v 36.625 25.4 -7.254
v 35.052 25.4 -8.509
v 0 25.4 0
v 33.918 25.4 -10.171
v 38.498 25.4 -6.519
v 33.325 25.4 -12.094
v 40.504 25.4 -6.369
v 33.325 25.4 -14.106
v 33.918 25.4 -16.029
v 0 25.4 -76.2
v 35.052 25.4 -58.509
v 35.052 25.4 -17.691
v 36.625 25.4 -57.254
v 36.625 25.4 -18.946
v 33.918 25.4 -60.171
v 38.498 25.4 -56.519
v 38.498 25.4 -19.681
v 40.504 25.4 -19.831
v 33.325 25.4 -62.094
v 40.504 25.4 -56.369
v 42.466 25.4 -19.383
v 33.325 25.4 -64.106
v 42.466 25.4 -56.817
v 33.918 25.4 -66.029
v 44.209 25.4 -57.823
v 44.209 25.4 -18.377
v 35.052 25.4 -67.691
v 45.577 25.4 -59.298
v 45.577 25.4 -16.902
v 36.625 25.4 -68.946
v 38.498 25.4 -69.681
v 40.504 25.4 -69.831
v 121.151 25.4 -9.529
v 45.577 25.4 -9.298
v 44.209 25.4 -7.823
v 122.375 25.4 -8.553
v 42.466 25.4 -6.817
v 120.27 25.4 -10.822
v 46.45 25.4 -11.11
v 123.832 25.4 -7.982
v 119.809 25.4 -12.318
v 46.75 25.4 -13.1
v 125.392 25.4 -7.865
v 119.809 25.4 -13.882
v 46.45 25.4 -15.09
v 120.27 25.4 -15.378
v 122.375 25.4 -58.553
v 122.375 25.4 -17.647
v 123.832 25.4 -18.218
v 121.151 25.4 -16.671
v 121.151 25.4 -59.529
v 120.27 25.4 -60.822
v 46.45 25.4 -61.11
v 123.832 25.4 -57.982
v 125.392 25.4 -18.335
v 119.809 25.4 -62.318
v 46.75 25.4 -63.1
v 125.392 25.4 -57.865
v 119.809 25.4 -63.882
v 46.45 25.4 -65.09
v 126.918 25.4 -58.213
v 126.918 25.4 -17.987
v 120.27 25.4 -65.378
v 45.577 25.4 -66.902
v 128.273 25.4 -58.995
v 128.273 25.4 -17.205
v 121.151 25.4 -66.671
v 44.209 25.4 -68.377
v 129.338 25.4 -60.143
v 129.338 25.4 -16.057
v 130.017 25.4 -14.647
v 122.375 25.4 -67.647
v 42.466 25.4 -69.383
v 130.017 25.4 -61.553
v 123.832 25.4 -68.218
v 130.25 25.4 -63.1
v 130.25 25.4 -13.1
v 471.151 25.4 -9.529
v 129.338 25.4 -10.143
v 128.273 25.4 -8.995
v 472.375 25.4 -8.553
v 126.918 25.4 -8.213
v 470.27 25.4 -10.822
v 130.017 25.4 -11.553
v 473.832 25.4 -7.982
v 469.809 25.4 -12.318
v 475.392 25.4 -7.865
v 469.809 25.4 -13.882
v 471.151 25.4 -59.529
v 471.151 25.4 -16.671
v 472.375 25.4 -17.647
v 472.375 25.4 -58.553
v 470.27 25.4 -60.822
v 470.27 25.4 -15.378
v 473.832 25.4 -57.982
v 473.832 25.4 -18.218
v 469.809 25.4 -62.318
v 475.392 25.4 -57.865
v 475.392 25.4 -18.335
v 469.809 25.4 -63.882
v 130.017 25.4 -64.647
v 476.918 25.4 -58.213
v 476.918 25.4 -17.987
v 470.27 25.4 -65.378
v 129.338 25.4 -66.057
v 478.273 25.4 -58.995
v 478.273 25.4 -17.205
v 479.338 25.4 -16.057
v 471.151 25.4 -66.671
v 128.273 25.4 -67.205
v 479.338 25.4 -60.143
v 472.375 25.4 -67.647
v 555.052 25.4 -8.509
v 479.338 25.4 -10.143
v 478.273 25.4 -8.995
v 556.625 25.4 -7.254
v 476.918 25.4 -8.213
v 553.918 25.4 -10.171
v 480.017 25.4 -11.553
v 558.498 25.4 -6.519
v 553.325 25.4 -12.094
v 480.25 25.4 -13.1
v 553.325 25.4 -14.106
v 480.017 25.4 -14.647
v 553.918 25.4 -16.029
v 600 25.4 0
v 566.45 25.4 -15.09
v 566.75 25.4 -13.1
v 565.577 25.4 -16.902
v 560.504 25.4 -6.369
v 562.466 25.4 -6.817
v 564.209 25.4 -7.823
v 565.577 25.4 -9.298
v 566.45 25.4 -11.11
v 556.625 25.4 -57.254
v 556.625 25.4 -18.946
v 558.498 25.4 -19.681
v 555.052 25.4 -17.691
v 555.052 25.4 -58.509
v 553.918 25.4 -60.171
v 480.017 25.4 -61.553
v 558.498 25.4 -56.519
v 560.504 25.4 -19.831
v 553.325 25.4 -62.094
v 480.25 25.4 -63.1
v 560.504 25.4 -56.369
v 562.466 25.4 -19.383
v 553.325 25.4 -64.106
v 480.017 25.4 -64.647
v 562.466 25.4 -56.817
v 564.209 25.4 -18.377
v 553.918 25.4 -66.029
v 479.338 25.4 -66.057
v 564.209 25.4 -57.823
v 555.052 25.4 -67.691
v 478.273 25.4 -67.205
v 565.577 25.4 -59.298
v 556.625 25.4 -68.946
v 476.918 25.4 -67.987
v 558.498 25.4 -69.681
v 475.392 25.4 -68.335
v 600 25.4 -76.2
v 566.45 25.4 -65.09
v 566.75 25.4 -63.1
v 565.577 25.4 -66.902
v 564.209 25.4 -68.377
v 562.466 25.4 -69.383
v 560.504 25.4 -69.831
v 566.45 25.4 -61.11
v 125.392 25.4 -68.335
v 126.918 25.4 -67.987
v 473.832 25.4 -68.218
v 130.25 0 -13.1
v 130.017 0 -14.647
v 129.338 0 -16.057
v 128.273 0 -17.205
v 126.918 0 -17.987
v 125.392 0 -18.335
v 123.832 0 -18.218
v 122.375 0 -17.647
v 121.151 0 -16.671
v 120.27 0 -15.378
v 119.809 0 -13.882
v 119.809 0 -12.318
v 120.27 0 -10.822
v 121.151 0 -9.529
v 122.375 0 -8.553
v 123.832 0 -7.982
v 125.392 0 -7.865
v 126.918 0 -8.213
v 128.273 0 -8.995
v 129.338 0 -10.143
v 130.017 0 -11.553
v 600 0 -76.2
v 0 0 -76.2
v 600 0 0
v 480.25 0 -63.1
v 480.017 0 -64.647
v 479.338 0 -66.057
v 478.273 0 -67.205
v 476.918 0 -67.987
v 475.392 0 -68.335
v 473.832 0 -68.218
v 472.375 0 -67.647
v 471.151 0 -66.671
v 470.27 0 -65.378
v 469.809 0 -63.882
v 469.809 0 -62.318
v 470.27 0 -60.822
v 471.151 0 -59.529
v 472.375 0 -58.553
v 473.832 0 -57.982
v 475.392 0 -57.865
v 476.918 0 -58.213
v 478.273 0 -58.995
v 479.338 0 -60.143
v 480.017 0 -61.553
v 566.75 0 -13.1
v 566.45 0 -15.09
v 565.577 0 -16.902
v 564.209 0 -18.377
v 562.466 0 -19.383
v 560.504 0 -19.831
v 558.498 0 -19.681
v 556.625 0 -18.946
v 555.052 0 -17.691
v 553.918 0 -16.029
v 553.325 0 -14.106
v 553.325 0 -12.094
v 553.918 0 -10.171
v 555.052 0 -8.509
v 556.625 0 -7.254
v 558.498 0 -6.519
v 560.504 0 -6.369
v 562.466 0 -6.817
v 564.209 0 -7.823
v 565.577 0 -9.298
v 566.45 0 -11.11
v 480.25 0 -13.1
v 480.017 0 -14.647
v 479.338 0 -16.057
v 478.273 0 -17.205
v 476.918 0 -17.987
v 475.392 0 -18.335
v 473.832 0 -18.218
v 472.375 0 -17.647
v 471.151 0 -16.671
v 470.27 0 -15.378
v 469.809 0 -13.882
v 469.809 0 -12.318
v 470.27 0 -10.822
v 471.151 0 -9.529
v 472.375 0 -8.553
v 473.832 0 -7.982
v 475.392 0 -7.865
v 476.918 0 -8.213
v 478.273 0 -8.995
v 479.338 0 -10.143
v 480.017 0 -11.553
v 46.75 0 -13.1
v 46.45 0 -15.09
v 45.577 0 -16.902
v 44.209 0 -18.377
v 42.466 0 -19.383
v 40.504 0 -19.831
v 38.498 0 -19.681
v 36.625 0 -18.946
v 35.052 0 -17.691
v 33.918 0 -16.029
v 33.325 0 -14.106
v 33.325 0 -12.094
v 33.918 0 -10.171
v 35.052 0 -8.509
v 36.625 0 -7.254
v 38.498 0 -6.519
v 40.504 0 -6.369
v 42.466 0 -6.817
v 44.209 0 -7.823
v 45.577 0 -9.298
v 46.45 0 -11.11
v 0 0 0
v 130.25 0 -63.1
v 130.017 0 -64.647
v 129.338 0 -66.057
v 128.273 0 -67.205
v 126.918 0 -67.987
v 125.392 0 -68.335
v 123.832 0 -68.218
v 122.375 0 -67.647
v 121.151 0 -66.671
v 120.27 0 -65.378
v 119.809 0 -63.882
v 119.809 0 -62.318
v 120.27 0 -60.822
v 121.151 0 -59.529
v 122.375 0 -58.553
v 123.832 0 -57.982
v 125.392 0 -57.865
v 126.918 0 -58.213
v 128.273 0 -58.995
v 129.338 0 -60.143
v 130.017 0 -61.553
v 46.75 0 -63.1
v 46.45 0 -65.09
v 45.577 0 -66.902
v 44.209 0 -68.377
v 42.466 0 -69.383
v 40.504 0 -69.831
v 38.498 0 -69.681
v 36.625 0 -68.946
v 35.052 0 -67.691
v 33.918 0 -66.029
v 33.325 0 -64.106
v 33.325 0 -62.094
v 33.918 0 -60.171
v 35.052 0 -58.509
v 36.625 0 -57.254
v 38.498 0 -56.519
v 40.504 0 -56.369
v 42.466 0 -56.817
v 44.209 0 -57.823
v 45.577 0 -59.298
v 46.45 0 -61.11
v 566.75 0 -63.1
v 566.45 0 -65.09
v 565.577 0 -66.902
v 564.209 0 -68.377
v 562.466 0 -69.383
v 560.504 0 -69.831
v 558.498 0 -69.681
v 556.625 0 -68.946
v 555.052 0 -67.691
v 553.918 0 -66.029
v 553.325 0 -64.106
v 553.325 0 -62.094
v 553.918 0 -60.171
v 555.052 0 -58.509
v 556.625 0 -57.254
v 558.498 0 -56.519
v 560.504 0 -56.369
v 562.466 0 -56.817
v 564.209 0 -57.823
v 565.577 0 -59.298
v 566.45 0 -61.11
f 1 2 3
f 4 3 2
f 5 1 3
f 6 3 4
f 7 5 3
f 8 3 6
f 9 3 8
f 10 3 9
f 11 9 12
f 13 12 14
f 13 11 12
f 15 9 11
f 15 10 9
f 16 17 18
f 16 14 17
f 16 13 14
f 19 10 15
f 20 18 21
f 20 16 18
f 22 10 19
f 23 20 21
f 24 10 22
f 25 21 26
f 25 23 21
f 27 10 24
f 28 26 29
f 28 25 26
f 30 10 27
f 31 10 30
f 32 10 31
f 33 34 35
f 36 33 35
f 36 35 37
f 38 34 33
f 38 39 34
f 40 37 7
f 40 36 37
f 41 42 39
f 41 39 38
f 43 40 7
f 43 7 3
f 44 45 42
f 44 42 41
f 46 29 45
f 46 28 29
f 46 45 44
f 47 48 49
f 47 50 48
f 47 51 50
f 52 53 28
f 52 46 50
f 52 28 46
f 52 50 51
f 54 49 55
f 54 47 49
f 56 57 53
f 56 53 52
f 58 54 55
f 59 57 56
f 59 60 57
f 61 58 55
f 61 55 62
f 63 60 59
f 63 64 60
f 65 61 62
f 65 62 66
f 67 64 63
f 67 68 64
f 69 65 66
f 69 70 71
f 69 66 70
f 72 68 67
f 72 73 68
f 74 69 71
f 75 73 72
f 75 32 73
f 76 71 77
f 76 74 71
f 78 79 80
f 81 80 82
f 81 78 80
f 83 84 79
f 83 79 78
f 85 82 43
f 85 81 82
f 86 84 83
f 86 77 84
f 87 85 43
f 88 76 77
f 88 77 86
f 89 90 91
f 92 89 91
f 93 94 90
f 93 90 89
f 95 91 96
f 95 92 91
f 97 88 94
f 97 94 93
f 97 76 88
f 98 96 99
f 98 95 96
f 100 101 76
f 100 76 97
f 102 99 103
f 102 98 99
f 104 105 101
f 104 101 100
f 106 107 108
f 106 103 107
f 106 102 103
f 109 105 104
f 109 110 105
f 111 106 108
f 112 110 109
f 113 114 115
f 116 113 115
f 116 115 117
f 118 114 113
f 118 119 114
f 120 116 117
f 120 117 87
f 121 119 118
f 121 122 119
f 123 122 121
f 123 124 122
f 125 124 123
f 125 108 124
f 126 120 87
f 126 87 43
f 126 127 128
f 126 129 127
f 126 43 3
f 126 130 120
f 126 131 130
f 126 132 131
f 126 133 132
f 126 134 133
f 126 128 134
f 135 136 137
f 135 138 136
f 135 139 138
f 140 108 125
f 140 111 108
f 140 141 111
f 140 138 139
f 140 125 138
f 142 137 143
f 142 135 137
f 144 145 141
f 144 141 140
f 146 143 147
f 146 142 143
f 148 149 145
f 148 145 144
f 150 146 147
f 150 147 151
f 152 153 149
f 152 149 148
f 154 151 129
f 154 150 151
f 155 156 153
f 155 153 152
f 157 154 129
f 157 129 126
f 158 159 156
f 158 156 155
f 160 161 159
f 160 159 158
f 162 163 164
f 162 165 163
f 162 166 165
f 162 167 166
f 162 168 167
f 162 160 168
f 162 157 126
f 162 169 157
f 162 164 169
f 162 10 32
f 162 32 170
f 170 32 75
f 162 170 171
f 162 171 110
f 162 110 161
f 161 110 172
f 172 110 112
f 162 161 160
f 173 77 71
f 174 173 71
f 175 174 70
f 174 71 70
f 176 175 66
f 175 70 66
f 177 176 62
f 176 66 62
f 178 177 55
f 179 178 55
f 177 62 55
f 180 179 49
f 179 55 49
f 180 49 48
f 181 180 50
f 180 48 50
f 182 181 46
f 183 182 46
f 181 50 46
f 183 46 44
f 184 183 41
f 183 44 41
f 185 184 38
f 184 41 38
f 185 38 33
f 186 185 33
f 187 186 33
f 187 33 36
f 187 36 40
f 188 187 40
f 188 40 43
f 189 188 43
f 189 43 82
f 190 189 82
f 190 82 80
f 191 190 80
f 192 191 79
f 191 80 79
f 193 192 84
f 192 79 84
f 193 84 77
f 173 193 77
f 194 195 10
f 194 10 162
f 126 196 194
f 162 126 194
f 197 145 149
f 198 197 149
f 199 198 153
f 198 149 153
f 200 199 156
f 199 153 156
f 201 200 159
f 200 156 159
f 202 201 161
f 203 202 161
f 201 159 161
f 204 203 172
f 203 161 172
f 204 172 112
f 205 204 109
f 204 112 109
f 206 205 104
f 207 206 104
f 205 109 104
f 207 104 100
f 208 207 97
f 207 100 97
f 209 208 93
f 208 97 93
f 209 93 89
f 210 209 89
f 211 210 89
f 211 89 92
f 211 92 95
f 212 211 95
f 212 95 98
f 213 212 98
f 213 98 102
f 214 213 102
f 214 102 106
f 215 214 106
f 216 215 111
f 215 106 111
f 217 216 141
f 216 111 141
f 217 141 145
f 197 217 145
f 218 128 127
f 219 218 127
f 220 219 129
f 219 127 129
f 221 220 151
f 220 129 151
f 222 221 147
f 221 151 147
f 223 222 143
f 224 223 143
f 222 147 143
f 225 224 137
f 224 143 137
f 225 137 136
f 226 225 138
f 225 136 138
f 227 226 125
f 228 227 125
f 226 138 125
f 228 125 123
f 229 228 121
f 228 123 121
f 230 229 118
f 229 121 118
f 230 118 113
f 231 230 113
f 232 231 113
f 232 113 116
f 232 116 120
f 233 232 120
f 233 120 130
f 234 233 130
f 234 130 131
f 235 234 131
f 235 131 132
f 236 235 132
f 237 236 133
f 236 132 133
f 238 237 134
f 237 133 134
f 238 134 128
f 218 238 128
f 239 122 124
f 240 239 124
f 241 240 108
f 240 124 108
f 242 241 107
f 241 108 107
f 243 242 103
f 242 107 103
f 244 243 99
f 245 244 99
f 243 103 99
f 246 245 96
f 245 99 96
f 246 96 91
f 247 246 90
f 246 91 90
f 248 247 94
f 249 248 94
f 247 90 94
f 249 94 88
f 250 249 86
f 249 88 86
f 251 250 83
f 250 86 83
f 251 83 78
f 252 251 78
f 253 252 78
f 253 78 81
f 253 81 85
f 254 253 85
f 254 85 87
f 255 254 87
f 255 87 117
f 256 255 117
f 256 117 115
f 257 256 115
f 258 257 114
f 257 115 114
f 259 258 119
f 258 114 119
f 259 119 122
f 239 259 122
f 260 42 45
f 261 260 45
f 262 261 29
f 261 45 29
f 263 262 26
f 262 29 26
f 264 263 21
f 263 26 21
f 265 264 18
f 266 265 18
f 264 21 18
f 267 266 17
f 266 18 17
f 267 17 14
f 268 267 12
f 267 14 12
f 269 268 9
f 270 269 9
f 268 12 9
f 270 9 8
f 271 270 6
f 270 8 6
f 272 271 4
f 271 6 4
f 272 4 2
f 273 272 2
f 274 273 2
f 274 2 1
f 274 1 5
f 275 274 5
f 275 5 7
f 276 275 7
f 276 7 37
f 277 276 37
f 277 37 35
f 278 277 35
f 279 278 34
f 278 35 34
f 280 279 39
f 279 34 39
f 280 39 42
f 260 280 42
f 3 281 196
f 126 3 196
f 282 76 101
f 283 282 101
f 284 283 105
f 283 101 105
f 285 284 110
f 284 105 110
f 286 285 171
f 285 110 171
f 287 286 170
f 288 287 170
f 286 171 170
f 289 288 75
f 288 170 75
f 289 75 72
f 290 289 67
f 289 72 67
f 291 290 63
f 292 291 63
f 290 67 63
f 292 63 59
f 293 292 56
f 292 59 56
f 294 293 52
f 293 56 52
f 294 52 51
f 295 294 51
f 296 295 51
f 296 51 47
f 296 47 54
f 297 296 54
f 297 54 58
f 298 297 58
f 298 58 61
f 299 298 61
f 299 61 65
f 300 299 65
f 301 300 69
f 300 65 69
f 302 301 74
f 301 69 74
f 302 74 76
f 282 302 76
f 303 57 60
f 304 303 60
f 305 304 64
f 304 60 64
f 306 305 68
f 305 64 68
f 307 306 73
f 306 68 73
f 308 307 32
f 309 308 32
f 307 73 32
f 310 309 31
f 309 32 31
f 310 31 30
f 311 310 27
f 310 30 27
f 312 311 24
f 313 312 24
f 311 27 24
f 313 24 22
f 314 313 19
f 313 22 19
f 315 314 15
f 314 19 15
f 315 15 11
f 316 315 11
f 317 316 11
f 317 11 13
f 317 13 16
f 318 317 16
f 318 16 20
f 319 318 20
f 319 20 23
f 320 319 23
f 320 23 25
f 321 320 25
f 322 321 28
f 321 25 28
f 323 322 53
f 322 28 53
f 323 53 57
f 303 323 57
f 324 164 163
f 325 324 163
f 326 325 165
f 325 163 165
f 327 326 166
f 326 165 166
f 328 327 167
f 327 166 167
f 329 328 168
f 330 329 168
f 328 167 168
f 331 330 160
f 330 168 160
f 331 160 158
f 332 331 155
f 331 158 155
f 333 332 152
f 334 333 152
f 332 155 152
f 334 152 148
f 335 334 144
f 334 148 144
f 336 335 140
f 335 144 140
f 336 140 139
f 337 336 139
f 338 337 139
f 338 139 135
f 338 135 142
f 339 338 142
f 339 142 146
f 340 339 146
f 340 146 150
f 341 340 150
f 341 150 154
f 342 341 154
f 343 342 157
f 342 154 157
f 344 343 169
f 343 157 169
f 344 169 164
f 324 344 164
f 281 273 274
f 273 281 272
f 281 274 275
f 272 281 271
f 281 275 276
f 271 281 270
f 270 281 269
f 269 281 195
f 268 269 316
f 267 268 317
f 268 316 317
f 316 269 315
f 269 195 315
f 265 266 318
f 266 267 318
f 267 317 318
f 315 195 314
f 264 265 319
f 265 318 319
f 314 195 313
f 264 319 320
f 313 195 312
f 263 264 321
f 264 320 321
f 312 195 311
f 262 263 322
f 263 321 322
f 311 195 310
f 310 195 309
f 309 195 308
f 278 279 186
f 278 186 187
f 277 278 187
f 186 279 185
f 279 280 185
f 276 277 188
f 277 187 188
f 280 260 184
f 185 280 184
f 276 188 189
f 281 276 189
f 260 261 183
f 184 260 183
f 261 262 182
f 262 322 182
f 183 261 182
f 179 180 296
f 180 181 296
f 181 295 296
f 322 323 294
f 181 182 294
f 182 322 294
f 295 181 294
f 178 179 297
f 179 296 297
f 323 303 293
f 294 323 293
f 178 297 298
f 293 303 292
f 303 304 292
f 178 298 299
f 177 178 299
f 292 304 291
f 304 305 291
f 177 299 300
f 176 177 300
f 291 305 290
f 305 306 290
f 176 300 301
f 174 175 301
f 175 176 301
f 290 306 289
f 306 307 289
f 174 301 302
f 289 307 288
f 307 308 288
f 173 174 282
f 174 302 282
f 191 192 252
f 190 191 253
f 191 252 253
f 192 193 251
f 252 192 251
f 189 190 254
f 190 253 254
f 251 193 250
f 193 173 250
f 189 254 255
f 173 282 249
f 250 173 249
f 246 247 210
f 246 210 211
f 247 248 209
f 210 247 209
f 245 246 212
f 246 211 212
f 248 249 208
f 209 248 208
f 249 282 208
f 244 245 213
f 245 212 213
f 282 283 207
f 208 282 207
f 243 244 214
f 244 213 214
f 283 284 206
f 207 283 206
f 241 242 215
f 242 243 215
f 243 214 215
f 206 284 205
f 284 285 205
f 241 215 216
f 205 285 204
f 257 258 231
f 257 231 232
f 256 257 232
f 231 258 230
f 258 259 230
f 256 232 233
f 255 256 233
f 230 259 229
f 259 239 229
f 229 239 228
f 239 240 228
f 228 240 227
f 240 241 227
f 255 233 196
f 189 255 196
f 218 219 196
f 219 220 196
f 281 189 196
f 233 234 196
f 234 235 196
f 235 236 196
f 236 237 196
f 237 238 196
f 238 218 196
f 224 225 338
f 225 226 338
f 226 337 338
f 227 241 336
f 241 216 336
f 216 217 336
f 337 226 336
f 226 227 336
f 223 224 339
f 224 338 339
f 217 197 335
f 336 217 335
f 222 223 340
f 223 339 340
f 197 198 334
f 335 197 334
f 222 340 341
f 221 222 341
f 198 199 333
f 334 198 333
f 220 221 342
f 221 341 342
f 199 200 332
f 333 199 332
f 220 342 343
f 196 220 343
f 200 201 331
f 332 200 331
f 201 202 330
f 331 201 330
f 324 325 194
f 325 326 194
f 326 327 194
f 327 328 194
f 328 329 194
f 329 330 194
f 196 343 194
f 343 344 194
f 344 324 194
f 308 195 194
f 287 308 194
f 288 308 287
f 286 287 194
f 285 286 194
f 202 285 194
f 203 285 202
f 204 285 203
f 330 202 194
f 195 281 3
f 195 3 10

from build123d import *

# Parameters (mm, degrees)
SKETCH1_W           = 600
SKETCH1_H           = 76.2
BOSS_EXTRUDE1_DEPTH = 25.4
SKETCH2_R           = 6.75
CUT_EXTRUDE1_DEPTH  = 25.4
SKETCH3_R           = 5.25
CUT_EXTRUDE2_DEPTH  = 25.4


with BuildPart() as part:
    # Sketch1 → Boss-Extrude1 (new body)
    with BuildSketch(Plane(origin=(0, 0, 0), x_dir=(1, 0, 0), z_dir=(0, 1, 0))):
        with Locations((300, 38.1)):
            Rectangle(SKETCH1_W, SKETCH1_H)
    extrude(amount=BOSS_EXTRUDE1_DEPTH)

    # Sketch2 → Cut-Extrude1 (cut)
    with BuildSketch(Plane(origin=(0, 25.4, 0), x_dir=(1, 0, 0), z_dir=(0, 1, 0))):
        with Locations((40, 63.1)):
            Circle(SKETCH2_R)
        with Locations((40, 13.1)):
            Circle(SKETCH2_R)
        with Locations((560, 13.1)):
            Circle(SKETCH2_R)
        with Locations((560, 63.1)):
            Circle(SKETCH2_R)
    extrude(amount=-CUT_EXTRUDE1_DEPTH, mode=Mode.SUBTRACT)

    # Sketch3 → Cut-Extrude2 (cut)
    with BuildSketch(Plane(origin=(0, 25.4, 0), x_dir=(1, 0, 0), z_dir=(0, 1, 0))):
        with Locations((125, 63.1)):
            Circle(SKETCH3_R)
        with Locations((125, 13.1)):
            Circle(SKETCH3_R)
        with Locations((475, 13.1)):
            Circle(SKETCH3_R)
        with Locations((475, 63.1)):
            Circle(SKETCH3_R)
    extrude(amount=-CUT_EXTRUDE2_DEPTH, mode=Mode.SUBTRACT)


solid = part.part
